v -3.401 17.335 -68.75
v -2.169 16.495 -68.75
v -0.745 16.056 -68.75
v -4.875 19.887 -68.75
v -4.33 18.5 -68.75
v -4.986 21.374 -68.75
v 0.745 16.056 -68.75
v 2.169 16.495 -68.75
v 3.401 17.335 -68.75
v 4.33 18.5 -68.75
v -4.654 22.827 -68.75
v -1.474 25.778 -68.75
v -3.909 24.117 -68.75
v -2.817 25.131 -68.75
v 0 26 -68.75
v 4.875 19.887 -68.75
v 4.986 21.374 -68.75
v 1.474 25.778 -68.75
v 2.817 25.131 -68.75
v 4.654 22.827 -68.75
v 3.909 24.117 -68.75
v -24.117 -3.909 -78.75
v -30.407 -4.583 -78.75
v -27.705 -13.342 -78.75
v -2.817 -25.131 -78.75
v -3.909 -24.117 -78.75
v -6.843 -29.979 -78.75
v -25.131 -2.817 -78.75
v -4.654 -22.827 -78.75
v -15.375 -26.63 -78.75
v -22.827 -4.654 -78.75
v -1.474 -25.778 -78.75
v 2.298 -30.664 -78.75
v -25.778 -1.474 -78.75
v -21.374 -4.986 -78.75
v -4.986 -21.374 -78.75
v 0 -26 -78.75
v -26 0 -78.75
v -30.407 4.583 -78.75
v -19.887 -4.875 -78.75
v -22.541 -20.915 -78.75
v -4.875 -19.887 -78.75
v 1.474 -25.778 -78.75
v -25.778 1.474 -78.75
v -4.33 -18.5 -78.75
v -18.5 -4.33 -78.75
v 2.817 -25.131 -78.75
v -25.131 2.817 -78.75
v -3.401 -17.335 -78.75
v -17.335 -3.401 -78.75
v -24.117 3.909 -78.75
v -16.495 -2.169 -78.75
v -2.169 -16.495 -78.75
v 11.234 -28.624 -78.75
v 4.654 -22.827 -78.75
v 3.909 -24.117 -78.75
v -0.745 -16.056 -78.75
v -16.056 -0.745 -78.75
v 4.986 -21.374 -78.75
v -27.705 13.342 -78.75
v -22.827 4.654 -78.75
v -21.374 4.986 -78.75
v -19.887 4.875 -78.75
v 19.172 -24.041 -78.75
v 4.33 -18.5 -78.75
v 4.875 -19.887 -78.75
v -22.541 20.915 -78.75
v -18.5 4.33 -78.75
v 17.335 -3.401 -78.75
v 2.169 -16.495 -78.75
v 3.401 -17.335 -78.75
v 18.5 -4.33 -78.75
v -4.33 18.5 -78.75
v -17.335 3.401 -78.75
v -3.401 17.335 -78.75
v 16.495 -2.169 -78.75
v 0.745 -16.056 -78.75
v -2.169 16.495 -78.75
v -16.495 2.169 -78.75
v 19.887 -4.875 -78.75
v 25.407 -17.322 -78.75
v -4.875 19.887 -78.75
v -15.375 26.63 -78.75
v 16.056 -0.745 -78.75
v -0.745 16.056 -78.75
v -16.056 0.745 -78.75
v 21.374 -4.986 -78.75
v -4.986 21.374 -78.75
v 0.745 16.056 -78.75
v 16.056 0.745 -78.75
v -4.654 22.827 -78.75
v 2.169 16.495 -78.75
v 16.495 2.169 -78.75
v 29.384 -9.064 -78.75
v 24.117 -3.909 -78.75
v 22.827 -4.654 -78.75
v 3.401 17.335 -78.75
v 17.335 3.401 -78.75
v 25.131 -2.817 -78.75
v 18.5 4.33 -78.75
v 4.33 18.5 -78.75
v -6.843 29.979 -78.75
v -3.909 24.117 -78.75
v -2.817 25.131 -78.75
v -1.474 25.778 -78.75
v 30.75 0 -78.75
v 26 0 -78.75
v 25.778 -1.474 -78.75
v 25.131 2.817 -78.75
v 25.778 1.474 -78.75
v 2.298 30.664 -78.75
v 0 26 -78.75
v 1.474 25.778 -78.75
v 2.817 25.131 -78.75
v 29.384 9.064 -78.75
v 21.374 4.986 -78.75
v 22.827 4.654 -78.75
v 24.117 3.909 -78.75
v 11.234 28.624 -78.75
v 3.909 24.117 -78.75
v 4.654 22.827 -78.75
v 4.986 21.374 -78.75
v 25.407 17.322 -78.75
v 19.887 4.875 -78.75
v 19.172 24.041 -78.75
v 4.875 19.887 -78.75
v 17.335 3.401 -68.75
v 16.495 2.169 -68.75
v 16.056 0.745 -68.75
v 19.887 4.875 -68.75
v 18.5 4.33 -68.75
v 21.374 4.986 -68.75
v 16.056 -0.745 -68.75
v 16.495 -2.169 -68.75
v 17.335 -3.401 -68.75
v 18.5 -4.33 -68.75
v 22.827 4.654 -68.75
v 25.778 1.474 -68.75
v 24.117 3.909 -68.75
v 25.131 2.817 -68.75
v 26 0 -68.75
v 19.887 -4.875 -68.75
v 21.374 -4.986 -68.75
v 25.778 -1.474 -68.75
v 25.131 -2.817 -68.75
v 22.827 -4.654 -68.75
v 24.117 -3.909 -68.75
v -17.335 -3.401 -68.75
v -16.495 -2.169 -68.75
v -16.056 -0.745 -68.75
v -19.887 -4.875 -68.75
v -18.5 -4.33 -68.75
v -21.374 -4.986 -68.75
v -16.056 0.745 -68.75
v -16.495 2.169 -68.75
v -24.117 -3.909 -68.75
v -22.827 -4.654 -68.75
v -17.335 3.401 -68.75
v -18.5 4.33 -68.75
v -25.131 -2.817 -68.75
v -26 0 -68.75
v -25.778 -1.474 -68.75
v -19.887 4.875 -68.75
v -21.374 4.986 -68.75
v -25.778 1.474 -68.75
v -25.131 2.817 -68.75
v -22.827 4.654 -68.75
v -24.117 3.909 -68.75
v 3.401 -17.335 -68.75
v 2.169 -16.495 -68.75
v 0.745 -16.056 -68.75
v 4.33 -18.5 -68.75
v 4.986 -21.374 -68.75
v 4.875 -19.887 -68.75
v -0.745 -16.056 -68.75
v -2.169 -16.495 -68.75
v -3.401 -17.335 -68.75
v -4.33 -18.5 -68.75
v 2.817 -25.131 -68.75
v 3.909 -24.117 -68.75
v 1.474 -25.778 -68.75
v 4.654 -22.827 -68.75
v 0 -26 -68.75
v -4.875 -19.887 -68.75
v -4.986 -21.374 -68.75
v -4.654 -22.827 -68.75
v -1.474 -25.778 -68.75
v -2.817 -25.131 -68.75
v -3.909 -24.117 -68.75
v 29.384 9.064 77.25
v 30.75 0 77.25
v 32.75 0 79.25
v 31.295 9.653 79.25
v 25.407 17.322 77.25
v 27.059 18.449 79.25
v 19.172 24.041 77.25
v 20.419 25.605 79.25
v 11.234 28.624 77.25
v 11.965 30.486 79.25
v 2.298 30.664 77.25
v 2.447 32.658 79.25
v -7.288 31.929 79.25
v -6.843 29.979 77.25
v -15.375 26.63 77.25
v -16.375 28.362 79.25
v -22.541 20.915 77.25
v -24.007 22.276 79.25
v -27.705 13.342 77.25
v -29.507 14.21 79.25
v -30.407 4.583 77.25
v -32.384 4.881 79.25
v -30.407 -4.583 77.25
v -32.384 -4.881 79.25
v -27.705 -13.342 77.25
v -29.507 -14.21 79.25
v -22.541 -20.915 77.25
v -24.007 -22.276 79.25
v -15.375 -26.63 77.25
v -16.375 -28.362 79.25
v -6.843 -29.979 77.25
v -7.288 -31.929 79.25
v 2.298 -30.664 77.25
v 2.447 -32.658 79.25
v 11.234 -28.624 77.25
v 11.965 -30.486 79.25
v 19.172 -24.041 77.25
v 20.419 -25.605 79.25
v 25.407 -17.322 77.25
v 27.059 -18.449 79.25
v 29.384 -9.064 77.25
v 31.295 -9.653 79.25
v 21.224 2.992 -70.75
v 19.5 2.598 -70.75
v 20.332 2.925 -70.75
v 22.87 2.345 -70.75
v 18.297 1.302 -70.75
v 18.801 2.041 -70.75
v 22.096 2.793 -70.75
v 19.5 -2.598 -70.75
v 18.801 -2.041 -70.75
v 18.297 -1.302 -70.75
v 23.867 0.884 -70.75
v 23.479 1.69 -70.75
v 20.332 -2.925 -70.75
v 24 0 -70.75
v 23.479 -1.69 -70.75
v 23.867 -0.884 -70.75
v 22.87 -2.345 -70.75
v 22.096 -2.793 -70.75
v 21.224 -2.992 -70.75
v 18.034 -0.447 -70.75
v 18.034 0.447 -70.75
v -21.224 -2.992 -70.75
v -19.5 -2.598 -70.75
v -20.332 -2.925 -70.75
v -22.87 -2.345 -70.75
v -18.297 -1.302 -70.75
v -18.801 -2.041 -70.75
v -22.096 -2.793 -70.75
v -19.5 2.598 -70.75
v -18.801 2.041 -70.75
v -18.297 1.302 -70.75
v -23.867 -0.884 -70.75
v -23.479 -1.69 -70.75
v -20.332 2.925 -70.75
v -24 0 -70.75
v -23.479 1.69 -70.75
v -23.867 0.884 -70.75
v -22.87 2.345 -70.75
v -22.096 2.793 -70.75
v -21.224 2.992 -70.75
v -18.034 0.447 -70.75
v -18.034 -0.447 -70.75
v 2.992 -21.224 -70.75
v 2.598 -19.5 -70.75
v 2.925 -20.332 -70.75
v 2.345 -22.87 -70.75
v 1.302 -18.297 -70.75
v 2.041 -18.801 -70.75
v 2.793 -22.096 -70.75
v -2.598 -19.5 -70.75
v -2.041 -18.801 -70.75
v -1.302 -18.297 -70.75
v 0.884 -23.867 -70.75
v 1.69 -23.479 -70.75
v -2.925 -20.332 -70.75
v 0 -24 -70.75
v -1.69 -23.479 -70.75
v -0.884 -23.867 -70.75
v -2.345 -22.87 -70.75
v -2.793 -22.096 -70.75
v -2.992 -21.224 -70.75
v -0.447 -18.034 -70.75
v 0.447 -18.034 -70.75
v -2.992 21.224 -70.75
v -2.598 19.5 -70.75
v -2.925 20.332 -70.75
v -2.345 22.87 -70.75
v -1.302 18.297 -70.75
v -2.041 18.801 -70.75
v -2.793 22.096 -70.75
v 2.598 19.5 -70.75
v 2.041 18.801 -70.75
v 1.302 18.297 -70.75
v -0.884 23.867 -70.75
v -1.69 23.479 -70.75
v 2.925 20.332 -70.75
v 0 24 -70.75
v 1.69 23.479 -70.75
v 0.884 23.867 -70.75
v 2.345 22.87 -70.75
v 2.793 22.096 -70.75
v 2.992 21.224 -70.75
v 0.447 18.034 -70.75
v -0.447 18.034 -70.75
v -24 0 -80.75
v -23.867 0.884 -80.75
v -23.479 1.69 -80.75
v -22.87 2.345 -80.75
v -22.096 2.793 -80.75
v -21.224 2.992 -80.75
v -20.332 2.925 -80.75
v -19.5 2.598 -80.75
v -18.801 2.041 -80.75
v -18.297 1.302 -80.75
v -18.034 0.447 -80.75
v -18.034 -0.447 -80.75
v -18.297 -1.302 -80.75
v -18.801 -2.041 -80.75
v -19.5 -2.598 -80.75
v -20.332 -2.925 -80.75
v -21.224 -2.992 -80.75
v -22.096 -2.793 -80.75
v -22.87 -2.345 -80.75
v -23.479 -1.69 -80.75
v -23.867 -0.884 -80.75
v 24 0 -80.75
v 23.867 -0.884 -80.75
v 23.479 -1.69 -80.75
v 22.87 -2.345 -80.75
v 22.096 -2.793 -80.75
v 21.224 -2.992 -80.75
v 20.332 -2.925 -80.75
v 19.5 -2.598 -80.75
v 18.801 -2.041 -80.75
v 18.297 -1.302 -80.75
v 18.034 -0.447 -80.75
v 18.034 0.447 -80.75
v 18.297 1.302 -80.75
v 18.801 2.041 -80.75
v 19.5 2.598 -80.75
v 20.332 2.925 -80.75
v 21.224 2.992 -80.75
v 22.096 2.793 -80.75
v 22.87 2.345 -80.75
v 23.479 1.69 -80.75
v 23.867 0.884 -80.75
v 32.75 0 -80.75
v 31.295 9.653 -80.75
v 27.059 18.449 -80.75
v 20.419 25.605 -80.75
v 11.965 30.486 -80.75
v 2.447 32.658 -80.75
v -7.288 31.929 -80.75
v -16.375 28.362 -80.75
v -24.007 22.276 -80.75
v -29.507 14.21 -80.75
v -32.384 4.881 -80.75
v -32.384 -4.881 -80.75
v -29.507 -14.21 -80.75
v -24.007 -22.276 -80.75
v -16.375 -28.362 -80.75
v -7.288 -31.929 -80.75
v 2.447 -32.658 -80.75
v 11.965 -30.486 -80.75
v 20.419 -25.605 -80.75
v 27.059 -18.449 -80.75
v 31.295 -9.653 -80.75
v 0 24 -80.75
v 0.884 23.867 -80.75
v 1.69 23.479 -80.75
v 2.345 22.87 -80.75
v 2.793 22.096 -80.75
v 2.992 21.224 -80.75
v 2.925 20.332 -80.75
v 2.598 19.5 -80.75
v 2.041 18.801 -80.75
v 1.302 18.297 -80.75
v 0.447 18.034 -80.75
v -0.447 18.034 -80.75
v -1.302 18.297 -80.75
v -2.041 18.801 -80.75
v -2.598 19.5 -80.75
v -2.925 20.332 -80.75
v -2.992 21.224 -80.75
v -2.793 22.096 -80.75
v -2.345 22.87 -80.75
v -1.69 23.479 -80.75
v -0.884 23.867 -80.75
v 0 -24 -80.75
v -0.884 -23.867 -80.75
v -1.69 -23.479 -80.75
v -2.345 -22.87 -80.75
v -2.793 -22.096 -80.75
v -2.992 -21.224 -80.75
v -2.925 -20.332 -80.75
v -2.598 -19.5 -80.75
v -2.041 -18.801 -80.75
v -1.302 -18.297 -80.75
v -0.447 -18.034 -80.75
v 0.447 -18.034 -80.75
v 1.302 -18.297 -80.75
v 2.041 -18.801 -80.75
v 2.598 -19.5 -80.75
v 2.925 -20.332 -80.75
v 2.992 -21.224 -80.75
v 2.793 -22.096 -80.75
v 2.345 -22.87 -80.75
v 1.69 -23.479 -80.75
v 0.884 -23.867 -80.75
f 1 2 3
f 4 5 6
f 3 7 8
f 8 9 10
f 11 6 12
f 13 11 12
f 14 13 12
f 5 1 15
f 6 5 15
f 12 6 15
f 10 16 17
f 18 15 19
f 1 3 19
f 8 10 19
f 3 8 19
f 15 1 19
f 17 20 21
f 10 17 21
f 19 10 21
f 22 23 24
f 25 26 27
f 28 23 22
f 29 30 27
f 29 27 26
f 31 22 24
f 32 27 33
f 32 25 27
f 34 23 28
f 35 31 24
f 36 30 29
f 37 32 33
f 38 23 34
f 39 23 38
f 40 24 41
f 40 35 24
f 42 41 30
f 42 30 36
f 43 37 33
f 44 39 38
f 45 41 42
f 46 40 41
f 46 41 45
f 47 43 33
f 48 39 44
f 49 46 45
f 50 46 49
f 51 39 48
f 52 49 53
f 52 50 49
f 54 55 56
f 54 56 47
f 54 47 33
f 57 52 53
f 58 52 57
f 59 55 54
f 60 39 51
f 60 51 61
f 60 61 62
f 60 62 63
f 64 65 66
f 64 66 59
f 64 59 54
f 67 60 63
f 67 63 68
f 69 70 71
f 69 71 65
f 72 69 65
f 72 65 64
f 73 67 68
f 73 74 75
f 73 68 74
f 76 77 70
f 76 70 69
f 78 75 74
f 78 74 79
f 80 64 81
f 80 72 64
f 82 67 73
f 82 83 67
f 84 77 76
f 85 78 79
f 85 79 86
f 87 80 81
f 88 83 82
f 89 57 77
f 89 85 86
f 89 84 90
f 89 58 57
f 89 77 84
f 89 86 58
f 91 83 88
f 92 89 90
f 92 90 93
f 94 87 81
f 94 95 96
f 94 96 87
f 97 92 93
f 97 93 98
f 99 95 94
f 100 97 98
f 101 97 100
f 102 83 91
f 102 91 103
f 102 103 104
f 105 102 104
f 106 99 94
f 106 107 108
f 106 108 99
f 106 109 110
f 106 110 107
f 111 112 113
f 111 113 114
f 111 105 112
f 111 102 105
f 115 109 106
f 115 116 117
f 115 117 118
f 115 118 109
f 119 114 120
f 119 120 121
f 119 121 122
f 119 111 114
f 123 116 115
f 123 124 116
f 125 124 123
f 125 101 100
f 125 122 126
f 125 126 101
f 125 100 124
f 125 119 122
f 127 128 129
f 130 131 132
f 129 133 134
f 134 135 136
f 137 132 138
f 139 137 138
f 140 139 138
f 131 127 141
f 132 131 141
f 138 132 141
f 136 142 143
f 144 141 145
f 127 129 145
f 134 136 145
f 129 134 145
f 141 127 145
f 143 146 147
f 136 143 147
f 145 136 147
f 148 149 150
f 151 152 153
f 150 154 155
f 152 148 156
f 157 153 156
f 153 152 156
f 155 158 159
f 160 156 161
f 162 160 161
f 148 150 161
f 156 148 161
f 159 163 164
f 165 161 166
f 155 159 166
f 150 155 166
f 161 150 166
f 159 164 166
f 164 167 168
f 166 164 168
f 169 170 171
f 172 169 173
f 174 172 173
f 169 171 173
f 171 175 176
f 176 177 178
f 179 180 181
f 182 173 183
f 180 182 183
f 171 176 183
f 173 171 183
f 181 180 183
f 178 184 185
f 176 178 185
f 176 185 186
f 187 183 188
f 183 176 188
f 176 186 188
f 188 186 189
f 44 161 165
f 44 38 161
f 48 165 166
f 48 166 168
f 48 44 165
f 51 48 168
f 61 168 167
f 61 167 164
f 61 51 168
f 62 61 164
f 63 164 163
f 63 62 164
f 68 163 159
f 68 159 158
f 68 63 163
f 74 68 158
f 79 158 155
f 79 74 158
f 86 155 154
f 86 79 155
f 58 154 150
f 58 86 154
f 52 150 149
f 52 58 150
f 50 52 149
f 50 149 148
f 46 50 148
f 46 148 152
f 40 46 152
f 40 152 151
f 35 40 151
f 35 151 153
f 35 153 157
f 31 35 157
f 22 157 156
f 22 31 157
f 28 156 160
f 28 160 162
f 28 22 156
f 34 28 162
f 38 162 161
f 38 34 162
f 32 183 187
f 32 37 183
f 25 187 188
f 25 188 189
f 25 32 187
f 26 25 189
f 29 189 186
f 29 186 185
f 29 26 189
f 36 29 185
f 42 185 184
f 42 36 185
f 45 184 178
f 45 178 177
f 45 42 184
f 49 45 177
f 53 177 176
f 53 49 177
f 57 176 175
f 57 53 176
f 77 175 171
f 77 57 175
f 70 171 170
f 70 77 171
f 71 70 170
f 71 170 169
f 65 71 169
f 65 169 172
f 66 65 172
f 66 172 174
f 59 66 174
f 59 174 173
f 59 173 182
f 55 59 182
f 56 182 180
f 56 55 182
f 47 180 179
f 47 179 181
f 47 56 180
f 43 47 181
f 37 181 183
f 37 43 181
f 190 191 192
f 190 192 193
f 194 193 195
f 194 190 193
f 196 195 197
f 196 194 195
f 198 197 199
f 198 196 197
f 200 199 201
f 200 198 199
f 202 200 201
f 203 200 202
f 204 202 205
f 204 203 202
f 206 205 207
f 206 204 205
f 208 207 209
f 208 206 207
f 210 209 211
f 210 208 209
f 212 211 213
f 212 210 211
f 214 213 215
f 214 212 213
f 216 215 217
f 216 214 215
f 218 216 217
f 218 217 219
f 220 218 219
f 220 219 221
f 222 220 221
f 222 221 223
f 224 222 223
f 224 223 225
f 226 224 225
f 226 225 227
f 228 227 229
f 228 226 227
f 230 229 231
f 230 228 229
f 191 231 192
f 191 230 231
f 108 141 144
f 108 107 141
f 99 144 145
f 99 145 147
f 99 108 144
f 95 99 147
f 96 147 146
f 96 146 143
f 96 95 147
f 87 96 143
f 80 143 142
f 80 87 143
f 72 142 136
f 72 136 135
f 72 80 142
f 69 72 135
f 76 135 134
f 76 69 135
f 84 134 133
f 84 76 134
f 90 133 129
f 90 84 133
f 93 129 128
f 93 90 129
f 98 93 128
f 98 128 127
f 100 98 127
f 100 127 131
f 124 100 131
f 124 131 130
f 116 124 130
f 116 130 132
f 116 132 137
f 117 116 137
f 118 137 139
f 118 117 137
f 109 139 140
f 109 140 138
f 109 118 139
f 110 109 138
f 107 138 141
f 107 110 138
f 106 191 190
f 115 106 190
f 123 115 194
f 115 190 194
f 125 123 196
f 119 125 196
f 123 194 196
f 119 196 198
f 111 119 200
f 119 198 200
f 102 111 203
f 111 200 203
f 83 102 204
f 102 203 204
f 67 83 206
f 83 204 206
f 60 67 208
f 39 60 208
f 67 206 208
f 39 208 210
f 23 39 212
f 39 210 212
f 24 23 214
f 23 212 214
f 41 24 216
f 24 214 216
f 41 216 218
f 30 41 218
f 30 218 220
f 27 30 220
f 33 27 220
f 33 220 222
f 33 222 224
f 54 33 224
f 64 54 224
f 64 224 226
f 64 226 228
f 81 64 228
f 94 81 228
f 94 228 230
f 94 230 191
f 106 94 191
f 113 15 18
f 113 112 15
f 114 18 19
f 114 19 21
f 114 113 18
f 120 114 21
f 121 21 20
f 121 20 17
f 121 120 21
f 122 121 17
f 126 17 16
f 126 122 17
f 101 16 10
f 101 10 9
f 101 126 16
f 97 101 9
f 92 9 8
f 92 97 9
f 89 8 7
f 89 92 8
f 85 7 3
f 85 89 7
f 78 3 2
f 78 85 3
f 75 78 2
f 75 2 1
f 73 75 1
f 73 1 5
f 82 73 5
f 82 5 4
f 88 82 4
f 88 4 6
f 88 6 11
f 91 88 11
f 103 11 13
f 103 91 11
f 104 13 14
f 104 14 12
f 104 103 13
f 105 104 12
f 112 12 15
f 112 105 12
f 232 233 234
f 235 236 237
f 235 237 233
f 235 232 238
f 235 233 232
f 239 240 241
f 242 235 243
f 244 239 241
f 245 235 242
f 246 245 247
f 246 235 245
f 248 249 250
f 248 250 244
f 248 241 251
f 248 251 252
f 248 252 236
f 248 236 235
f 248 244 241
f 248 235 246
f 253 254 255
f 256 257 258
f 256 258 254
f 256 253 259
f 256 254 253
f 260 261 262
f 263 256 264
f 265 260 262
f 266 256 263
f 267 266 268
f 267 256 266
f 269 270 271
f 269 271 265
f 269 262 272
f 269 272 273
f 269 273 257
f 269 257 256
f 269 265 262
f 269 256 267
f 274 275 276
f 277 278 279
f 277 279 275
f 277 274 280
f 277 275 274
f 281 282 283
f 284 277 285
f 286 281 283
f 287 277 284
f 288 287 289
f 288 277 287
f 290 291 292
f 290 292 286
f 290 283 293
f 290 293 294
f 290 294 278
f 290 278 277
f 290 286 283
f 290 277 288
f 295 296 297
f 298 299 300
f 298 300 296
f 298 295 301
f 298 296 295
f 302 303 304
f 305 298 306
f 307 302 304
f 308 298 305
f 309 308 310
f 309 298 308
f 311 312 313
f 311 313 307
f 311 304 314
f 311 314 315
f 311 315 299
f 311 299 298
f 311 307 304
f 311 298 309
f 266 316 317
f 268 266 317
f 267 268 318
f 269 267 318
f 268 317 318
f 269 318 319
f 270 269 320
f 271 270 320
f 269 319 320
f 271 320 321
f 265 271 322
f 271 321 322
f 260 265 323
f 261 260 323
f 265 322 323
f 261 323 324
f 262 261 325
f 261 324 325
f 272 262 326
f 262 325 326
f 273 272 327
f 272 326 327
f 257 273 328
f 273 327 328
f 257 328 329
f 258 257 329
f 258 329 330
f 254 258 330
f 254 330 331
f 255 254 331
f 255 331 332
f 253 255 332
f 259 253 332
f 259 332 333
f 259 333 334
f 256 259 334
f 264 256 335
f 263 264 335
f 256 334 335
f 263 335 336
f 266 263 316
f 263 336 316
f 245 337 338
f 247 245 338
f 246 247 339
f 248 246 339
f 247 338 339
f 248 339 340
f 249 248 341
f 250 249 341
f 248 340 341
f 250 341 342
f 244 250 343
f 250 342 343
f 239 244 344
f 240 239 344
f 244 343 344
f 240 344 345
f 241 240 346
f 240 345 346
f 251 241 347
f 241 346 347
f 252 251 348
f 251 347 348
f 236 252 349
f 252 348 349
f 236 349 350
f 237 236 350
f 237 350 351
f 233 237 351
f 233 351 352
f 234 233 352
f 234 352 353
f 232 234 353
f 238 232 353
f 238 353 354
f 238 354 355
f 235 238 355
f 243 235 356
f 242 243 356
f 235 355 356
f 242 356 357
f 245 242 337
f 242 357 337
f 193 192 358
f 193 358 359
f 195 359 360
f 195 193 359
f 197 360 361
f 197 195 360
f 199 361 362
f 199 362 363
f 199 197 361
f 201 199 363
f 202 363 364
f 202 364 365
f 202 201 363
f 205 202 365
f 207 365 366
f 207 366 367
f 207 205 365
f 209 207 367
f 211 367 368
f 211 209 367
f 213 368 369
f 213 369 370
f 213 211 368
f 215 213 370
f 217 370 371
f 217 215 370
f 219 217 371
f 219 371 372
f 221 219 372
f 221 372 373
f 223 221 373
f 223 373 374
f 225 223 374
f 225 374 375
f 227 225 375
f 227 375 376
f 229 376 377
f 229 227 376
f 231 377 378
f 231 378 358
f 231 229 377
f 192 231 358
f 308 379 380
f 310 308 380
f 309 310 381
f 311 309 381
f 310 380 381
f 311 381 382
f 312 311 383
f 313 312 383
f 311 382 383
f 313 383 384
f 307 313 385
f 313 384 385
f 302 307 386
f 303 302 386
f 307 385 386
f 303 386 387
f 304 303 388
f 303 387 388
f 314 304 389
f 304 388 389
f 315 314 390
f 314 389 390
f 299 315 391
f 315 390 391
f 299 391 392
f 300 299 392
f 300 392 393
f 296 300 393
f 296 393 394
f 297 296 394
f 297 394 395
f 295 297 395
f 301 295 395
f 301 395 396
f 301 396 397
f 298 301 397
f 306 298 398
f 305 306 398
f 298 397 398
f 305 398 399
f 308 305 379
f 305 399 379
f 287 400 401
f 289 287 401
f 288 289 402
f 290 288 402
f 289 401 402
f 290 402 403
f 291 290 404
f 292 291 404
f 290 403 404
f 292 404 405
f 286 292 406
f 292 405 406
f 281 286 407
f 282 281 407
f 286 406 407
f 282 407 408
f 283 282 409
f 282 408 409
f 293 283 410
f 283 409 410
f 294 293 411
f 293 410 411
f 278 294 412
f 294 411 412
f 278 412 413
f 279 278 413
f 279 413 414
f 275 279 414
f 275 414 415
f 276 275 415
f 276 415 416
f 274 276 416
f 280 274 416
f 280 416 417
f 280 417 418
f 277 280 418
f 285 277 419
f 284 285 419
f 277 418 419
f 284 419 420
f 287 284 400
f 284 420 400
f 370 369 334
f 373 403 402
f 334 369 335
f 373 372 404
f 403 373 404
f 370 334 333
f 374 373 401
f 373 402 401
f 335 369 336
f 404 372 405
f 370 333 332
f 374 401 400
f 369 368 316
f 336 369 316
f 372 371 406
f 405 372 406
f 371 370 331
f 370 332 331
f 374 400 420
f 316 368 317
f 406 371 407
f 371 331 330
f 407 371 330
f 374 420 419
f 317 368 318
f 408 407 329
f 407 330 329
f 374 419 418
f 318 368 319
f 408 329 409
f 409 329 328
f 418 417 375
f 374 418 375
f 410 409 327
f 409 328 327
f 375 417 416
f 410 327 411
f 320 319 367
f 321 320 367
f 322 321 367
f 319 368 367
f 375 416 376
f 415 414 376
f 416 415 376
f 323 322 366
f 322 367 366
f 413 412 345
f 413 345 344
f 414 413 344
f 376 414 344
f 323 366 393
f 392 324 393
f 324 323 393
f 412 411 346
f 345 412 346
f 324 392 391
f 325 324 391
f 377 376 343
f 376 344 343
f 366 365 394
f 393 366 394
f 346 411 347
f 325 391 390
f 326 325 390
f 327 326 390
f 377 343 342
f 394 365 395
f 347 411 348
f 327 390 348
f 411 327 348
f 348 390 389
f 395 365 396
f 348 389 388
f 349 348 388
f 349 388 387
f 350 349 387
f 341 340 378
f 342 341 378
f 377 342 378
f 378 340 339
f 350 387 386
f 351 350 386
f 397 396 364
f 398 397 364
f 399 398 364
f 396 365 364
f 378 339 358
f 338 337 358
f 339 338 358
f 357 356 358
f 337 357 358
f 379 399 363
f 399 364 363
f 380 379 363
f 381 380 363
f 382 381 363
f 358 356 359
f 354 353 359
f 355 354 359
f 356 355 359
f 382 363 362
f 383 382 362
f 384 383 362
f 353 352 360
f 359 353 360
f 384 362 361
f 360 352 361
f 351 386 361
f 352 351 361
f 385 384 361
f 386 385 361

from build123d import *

# Parameters (mm, degrees)
SKETCH1_R           = 32.75
BOSS_EXTRUDE1_DEPTH = 80.75
SKETCH12_R          = 6
BOSS_EXTRUDE5_DEPTH = 63
SKETCH14_R          = 3
CUT_EXTRUDE2_DEPTH  = 10
CIRPATTERN2_COUNT   = 4
CUT_EXTRUDE5_START  = -1.5
SKETCH17_R          = 50
CUT_EXTRUDE5_DEPTH  = 170.510044343
SHELL1_T            = -2
CHAMFER2_SIZE       = 2


with BuildPart() as part:
    # Sketch1 → Boss-Extrude1 (new, symmetric)
    with BuildSketch(Plane.XY):
        Circle(SKETCH1_R)
    extrude(amount=BOSS_EXTRUDE1_DEPTH, both=True)

    # Sketch10 → Revolve1 (revolve)
    with BuildSketch(Plane(origin=(0, 0, 0), x_dir=(0, 0, -1), z_dir=(1, 0, 0)), mode=Mode.PRIVATE) as revolve1_sk:
        Polygon((-97.75, 0), (-97.75, 14), (-80.75, 19), (-80.75, 0), align=None)
    revolve(revolve1_sk.sketch.rotate(Axis((0, 0, 1000), (0, 0, -1)), 90), axis=Axis((0, 0, 1000), (0, 0, -1)))

    # Sketch12 → Boss-Extrude5 (add)
    with BuildSketch(Plane.XY.offset(97.75)):
        Circle(SKETCH12_R)
    extrude(amount=BOSS_EXTRUDE5_DEPTH)

    # Sketch14 → Cut-Extrude2 (cut)
    with BuildSketch(Plane(origin=(0, 0, -80.75), x_dir=(-1, 0, 0), z_dir=(0, 0, -1))):
        with Locations((21, 0)):
            Circle(SKETCH14_R)
    cut_extrude2 = extrude(amount=-CUT_EXTRUDE2_DEPTH, mode=Mode.SUBTRACT)

    # CirPattern2: Cut-Extrude2 ×4 about axis
    cirpattern2_axis = Axis((0, 0, 0), (0, 0, 1))
    for i in range(1, CIRPATTERN2_COUNT):
        add(cut_extrude2.rotate(cirpattern2_axis, i * 360 / CIRPATTERN2_COUNT), mode=Mode.SUBTRACT)

    # Sketch17 → Cut-Extrude5 (cut, through all)
    with BuildSketch(Plane.XY.offset(80.75).offset(CUT_EXTRUDE5_START)):
        Circle(SKETCH17_R)
    extrude(amount=CUT_EXTRUDE5_DEPTH, mode=Mode.SUBTRACT)

    # Shell1
    shell1_openings = [part.faces().sort_by_distance(p)[0] for p in [
        (0, 0, 79.25),
    ]]
    offset(amount=SHELL1_T, openings=shell1_openings, kind=Kind.INTERSECTION)

    # Chamfer2
    chamfer2_edges = [part.edges().sort_by_distance(p)[0] for p in [
        (-30.75, 0, 79.25),
    ]]
    chamfer(chamfer2_edges, length=CHAMFER2_SIZE - 0.0001)  # a hair under: the kernel refuses the full size


solid = part.part
